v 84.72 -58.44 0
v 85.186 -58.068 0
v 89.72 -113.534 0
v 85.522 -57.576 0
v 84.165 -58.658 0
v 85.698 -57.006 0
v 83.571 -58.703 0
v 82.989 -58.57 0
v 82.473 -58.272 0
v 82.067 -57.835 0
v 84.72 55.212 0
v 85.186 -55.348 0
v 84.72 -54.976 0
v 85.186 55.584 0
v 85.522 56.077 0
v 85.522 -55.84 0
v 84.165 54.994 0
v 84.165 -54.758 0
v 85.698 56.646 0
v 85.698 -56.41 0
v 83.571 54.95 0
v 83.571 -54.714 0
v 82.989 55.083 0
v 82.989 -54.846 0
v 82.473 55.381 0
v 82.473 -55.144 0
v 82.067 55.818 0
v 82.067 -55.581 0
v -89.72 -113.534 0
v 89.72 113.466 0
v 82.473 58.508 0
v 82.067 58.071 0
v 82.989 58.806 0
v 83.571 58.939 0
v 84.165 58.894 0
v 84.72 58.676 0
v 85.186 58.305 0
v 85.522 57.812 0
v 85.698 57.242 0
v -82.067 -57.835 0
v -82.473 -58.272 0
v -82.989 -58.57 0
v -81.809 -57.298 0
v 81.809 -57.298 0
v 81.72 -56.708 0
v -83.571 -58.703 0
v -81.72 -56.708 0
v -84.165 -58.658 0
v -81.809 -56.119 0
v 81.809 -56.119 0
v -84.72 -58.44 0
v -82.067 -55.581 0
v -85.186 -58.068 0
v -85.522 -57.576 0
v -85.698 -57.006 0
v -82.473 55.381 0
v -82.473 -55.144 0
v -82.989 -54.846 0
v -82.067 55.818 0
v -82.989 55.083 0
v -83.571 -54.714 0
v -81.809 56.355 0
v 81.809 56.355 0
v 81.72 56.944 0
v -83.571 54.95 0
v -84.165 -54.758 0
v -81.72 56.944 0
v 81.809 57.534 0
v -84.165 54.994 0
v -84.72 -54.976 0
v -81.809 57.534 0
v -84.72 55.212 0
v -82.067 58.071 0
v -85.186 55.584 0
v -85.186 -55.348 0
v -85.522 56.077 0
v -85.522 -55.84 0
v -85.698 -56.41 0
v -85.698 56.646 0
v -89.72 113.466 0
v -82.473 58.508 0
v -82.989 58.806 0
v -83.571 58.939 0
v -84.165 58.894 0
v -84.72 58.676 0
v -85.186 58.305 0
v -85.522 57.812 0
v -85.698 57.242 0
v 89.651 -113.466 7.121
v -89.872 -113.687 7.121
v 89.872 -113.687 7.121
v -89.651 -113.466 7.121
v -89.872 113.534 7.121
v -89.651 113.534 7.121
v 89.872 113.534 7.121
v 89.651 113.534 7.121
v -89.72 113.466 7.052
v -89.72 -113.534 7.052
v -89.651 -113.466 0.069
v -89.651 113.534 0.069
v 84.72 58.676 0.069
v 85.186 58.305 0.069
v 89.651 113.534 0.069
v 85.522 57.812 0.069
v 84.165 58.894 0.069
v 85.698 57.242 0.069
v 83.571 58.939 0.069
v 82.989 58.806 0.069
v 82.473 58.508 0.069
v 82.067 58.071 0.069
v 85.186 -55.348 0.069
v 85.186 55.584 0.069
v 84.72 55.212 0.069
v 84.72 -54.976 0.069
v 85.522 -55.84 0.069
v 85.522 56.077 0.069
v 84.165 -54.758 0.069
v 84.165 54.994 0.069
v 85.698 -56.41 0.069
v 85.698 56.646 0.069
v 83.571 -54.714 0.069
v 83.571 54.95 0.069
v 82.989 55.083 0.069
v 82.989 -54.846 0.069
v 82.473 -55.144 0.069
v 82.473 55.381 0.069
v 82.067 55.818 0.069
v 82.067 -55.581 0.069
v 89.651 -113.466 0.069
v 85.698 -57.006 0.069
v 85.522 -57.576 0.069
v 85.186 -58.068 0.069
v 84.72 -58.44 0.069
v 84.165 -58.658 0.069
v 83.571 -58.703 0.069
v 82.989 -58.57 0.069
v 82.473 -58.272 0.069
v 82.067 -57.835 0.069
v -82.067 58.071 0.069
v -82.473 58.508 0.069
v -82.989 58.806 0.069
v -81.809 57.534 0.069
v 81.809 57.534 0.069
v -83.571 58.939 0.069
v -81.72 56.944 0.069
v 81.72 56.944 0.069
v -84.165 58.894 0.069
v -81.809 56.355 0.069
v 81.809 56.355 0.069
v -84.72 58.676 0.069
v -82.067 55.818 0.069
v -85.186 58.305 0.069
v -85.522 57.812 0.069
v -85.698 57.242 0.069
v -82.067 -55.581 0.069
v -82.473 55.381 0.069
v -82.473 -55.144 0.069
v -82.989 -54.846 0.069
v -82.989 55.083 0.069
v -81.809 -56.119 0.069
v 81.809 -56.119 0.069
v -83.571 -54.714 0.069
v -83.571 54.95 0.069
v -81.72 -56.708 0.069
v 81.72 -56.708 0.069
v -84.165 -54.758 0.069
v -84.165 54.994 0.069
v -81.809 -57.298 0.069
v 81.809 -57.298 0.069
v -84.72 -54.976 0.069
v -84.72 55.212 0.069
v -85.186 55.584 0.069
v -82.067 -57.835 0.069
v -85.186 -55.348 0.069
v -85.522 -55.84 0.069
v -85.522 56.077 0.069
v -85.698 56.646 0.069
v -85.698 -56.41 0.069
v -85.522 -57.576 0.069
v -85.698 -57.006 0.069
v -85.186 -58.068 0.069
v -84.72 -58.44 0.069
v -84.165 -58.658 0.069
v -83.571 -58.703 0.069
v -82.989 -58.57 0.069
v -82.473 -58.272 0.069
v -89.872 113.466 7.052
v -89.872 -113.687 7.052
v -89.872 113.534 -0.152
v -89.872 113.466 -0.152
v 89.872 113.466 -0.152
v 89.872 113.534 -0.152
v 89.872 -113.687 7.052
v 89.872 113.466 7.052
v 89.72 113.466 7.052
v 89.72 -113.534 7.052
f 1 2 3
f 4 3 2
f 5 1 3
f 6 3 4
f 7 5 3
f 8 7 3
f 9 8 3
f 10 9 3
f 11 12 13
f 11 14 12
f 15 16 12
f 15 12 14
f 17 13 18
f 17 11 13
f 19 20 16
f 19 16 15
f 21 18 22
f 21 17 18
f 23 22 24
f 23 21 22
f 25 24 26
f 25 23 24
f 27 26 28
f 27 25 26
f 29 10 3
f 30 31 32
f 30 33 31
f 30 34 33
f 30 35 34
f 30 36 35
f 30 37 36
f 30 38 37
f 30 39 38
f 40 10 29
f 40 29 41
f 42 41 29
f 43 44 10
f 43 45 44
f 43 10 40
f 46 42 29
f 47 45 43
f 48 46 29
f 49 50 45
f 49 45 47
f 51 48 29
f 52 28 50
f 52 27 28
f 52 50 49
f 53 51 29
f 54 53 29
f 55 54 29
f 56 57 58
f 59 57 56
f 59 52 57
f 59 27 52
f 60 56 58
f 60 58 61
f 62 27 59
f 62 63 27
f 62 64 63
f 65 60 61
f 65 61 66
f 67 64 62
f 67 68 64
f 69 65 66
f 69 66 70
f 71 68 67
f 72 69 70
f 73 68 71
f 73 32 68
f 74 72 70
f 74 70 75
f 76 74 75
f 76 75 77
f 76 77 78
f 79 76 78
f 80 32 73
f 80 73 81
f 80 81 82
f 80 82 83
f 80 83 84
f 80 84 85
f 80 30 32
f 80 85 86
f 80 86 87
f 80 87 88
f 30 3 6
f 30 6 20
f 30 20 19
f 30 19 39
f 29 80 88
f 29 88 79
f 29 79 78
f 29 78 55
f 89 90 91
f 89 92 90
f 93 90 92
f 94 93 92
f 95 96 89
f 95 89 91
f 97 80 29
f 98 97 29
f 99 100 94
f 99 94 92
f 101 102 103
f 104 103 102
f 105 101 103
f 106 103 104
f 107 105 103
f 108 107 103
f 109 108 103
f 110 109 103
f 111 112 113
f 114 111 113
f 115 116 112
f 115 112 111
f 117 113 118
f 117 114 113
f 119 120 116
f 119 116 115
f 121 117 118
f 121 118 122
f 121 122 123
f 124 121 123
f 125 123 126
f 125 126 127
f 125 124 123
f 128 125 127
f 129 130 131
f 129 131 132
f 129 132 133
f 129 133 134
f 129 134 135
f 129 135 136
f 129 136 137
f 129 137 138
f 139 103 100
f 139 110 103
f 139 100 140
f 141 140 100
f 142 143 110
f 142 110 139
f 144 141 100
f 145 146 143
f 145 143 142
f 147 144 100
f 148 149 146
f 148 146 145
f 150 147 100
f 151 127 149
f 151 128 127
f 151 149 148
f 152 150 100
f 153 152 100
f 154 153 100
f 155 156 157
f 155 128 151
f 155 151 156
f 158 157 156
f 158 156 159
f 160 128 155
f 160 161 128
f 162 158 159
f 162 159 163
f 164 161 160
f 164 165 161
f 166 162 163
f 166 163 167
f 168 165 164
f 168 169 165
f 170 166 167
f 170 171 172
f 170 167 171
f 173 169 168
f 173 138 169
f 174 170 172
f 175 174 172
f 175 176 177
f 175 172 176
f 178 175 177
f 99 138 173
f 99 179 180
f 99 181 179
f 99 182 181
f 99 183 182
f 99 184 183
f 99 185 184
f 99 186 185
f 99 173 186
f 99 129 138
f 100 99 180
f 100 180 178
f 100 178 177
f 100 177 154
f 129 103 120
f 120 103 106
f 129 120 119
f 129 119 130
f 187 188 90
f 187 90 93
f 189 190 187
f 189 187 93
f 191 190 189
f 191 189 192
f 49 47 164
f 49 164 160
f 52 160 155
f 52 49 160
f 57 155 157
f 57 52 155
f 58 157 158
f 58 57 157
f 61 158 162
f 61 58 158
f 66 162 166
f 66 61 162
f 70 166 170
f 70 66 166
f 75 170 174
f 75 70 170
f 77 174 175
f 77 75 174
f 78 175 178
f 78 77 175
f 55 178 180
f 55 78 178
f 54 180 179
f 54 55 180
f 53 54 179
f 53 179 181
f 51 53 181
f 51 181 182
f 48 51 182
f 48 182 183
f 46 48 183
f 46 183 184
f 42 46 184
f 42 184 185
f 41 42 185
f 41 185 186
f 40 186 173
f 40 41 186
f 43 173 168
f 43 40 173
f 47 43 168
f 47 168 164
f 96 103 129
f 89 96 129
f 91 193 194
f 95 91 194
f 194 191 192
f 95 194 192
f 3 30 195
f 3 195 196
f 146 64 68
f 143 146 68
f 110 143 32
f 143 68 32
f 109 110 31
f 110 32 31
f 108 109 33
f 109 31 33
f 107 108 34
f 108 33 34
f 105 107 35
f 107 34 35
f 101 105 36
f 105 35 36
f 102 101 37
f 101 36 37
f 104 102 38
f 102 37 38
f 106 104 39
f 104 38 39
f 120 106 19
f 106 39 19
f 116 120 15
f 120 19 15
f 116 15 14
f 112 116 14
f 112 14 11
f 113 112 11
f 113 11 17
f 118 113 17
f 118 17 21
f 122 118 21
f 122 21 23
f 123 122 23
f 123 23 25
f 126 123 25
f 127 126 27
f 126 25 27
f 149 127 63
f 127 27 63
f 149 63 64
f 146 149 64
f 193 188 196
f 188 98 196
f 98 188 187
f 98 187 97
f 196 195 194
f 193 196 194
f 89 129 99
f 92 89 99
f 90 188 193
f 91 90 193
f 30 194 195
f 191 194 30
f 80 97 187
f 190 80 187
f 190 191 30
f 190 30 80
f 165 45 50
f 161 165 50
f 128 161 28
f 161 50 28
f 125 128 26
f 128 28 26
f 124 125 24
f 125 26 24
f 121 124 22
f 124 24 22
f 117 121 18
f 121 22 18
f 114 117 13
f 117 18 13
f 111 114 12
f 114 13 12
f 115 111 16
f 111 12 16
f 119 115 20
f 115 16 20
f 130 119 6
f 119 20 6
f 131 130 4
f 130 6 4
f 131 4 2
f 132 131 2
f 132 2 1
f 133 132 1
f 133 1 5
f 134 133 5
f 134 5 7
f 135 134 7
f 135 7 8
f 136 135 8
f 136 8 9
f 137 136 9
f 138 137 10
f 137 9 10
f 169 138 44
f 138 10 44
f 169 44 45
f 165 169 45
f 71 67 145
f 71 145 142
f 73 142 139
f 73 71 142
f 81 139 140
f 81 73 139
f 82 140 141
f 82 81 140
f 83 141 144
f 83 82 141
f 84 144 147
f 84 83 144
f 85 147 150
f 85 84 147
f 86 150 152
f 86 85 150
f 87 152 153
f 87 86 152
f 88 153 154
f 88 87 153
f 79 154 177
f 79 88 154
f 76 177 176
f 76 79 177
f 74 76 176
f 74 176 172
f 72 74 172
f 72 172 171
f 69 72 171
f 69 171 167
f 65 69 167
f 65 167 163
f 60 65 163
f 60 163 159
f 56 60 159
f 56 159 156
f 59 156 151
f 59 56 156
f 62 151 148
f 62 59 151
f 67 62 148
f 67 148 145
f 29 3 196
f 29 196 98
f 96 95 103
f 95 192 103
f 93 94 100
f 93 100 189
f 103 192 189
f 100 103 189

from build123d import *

# Parameters (mm, degrees)
SKETCH1_W             = 89.6514
SKETCH1_H             = 226.9314
SKETCH1_R             = 2
HEAT_EXCHANGER_DEPTH  = 0.0686
CONVECTION_FINS_DEPTH = 7.0524
TOP_OVERWRAP_DEPTH    = 0.0686
SIDE_OVERWRAP_DEPTH   = 0.0686


with BuildPart() as part:
    # Sketch1 → Heat Exchanger (new body)
    with BuildSketch(Plane.XY):
        with Locations((-44.8257, 0)):
            Rectangle(SKETCH1_W, SKETCH1_H)
        with Locations((-83.71996294, -56.7081132)):
            Circle(SKETCH1_R, mode=Mode.SUBTRACT)
        with Locations((-83.71996294, 56.94427919)):
            Circle(SKETCH1_R, mode=Mode.SUBTRACT)
    heat_exchanger = extrude(amount=HEAT_EXCHANGER_DEPTH)

    # Sketch3 → Convection Fins (add)
    with BuildSketch(Plane.XY):
        Polygon((0, -113.5343), (0, -113.4657), (-89.6514, -113.4657), (-89.6514, 113.4657), (-89.72, 113.4657), (-89.72, -113.5343), align=None)
    convection_fins = extrude(amount=CONVECTION_FINS_DEPTH)

    # Sketch5 → Top Overwrap (add)
    with BuildSketch(Plane(origin=(0, 113.4657, 0), x_dir=(1, 0, 0), z_dir=(0, 1, 0))):
        Polygon((-89.8724, -7.0524), (-89.6514, -7.0524), (-89.6514, -0.0686), (0, -0.0686), (0, 0.1524), (-89.8724, 0.1524), align=None)
    top_overwrap = extrude(amount=TOP_OVERWRAP_DEPTH)

    # Sketch7 → Side Overwrap (add)
    with BuildSketch(Plane.XY.offset(7.0524)):
        Polygon((-89.8724, 113.5343), (-89.6514, 113.5343), (-89.6514, -113.4657), (0, -113.4657), (0, -113.6867), (-89.8724, -113.6867), align=None)
    side_overwrap = extrude(amount=SIDE_OVERWRAP_DEPTH)

    # Mirror1: Heat Exchanger, Convection Fins, Top Overwrap, Side Overwrap across plane
    add(heat_exchanger.mirror(Plane(origin=(0, 0, 0), x_dir=(0, 0, 1), z_dir=(1, 0, 0))))
    add(convection_fins.mirror(Plane(origin=(0, 0, 0), x_dir=(0, 0, 1), z_dir=(1, 0, 0))))
    add(top_overwrap.mirror(Plane(origin=(0, 0, 0), x_dir=(0, 0, 1), z_dir=(1, 0, 0))))
    add(side_overwrap.mirror(Plane(origin=(0, 0, 0), x_dir=(0, 0, 1), z_dir=(1, 0, 0))))


solid = part.part
